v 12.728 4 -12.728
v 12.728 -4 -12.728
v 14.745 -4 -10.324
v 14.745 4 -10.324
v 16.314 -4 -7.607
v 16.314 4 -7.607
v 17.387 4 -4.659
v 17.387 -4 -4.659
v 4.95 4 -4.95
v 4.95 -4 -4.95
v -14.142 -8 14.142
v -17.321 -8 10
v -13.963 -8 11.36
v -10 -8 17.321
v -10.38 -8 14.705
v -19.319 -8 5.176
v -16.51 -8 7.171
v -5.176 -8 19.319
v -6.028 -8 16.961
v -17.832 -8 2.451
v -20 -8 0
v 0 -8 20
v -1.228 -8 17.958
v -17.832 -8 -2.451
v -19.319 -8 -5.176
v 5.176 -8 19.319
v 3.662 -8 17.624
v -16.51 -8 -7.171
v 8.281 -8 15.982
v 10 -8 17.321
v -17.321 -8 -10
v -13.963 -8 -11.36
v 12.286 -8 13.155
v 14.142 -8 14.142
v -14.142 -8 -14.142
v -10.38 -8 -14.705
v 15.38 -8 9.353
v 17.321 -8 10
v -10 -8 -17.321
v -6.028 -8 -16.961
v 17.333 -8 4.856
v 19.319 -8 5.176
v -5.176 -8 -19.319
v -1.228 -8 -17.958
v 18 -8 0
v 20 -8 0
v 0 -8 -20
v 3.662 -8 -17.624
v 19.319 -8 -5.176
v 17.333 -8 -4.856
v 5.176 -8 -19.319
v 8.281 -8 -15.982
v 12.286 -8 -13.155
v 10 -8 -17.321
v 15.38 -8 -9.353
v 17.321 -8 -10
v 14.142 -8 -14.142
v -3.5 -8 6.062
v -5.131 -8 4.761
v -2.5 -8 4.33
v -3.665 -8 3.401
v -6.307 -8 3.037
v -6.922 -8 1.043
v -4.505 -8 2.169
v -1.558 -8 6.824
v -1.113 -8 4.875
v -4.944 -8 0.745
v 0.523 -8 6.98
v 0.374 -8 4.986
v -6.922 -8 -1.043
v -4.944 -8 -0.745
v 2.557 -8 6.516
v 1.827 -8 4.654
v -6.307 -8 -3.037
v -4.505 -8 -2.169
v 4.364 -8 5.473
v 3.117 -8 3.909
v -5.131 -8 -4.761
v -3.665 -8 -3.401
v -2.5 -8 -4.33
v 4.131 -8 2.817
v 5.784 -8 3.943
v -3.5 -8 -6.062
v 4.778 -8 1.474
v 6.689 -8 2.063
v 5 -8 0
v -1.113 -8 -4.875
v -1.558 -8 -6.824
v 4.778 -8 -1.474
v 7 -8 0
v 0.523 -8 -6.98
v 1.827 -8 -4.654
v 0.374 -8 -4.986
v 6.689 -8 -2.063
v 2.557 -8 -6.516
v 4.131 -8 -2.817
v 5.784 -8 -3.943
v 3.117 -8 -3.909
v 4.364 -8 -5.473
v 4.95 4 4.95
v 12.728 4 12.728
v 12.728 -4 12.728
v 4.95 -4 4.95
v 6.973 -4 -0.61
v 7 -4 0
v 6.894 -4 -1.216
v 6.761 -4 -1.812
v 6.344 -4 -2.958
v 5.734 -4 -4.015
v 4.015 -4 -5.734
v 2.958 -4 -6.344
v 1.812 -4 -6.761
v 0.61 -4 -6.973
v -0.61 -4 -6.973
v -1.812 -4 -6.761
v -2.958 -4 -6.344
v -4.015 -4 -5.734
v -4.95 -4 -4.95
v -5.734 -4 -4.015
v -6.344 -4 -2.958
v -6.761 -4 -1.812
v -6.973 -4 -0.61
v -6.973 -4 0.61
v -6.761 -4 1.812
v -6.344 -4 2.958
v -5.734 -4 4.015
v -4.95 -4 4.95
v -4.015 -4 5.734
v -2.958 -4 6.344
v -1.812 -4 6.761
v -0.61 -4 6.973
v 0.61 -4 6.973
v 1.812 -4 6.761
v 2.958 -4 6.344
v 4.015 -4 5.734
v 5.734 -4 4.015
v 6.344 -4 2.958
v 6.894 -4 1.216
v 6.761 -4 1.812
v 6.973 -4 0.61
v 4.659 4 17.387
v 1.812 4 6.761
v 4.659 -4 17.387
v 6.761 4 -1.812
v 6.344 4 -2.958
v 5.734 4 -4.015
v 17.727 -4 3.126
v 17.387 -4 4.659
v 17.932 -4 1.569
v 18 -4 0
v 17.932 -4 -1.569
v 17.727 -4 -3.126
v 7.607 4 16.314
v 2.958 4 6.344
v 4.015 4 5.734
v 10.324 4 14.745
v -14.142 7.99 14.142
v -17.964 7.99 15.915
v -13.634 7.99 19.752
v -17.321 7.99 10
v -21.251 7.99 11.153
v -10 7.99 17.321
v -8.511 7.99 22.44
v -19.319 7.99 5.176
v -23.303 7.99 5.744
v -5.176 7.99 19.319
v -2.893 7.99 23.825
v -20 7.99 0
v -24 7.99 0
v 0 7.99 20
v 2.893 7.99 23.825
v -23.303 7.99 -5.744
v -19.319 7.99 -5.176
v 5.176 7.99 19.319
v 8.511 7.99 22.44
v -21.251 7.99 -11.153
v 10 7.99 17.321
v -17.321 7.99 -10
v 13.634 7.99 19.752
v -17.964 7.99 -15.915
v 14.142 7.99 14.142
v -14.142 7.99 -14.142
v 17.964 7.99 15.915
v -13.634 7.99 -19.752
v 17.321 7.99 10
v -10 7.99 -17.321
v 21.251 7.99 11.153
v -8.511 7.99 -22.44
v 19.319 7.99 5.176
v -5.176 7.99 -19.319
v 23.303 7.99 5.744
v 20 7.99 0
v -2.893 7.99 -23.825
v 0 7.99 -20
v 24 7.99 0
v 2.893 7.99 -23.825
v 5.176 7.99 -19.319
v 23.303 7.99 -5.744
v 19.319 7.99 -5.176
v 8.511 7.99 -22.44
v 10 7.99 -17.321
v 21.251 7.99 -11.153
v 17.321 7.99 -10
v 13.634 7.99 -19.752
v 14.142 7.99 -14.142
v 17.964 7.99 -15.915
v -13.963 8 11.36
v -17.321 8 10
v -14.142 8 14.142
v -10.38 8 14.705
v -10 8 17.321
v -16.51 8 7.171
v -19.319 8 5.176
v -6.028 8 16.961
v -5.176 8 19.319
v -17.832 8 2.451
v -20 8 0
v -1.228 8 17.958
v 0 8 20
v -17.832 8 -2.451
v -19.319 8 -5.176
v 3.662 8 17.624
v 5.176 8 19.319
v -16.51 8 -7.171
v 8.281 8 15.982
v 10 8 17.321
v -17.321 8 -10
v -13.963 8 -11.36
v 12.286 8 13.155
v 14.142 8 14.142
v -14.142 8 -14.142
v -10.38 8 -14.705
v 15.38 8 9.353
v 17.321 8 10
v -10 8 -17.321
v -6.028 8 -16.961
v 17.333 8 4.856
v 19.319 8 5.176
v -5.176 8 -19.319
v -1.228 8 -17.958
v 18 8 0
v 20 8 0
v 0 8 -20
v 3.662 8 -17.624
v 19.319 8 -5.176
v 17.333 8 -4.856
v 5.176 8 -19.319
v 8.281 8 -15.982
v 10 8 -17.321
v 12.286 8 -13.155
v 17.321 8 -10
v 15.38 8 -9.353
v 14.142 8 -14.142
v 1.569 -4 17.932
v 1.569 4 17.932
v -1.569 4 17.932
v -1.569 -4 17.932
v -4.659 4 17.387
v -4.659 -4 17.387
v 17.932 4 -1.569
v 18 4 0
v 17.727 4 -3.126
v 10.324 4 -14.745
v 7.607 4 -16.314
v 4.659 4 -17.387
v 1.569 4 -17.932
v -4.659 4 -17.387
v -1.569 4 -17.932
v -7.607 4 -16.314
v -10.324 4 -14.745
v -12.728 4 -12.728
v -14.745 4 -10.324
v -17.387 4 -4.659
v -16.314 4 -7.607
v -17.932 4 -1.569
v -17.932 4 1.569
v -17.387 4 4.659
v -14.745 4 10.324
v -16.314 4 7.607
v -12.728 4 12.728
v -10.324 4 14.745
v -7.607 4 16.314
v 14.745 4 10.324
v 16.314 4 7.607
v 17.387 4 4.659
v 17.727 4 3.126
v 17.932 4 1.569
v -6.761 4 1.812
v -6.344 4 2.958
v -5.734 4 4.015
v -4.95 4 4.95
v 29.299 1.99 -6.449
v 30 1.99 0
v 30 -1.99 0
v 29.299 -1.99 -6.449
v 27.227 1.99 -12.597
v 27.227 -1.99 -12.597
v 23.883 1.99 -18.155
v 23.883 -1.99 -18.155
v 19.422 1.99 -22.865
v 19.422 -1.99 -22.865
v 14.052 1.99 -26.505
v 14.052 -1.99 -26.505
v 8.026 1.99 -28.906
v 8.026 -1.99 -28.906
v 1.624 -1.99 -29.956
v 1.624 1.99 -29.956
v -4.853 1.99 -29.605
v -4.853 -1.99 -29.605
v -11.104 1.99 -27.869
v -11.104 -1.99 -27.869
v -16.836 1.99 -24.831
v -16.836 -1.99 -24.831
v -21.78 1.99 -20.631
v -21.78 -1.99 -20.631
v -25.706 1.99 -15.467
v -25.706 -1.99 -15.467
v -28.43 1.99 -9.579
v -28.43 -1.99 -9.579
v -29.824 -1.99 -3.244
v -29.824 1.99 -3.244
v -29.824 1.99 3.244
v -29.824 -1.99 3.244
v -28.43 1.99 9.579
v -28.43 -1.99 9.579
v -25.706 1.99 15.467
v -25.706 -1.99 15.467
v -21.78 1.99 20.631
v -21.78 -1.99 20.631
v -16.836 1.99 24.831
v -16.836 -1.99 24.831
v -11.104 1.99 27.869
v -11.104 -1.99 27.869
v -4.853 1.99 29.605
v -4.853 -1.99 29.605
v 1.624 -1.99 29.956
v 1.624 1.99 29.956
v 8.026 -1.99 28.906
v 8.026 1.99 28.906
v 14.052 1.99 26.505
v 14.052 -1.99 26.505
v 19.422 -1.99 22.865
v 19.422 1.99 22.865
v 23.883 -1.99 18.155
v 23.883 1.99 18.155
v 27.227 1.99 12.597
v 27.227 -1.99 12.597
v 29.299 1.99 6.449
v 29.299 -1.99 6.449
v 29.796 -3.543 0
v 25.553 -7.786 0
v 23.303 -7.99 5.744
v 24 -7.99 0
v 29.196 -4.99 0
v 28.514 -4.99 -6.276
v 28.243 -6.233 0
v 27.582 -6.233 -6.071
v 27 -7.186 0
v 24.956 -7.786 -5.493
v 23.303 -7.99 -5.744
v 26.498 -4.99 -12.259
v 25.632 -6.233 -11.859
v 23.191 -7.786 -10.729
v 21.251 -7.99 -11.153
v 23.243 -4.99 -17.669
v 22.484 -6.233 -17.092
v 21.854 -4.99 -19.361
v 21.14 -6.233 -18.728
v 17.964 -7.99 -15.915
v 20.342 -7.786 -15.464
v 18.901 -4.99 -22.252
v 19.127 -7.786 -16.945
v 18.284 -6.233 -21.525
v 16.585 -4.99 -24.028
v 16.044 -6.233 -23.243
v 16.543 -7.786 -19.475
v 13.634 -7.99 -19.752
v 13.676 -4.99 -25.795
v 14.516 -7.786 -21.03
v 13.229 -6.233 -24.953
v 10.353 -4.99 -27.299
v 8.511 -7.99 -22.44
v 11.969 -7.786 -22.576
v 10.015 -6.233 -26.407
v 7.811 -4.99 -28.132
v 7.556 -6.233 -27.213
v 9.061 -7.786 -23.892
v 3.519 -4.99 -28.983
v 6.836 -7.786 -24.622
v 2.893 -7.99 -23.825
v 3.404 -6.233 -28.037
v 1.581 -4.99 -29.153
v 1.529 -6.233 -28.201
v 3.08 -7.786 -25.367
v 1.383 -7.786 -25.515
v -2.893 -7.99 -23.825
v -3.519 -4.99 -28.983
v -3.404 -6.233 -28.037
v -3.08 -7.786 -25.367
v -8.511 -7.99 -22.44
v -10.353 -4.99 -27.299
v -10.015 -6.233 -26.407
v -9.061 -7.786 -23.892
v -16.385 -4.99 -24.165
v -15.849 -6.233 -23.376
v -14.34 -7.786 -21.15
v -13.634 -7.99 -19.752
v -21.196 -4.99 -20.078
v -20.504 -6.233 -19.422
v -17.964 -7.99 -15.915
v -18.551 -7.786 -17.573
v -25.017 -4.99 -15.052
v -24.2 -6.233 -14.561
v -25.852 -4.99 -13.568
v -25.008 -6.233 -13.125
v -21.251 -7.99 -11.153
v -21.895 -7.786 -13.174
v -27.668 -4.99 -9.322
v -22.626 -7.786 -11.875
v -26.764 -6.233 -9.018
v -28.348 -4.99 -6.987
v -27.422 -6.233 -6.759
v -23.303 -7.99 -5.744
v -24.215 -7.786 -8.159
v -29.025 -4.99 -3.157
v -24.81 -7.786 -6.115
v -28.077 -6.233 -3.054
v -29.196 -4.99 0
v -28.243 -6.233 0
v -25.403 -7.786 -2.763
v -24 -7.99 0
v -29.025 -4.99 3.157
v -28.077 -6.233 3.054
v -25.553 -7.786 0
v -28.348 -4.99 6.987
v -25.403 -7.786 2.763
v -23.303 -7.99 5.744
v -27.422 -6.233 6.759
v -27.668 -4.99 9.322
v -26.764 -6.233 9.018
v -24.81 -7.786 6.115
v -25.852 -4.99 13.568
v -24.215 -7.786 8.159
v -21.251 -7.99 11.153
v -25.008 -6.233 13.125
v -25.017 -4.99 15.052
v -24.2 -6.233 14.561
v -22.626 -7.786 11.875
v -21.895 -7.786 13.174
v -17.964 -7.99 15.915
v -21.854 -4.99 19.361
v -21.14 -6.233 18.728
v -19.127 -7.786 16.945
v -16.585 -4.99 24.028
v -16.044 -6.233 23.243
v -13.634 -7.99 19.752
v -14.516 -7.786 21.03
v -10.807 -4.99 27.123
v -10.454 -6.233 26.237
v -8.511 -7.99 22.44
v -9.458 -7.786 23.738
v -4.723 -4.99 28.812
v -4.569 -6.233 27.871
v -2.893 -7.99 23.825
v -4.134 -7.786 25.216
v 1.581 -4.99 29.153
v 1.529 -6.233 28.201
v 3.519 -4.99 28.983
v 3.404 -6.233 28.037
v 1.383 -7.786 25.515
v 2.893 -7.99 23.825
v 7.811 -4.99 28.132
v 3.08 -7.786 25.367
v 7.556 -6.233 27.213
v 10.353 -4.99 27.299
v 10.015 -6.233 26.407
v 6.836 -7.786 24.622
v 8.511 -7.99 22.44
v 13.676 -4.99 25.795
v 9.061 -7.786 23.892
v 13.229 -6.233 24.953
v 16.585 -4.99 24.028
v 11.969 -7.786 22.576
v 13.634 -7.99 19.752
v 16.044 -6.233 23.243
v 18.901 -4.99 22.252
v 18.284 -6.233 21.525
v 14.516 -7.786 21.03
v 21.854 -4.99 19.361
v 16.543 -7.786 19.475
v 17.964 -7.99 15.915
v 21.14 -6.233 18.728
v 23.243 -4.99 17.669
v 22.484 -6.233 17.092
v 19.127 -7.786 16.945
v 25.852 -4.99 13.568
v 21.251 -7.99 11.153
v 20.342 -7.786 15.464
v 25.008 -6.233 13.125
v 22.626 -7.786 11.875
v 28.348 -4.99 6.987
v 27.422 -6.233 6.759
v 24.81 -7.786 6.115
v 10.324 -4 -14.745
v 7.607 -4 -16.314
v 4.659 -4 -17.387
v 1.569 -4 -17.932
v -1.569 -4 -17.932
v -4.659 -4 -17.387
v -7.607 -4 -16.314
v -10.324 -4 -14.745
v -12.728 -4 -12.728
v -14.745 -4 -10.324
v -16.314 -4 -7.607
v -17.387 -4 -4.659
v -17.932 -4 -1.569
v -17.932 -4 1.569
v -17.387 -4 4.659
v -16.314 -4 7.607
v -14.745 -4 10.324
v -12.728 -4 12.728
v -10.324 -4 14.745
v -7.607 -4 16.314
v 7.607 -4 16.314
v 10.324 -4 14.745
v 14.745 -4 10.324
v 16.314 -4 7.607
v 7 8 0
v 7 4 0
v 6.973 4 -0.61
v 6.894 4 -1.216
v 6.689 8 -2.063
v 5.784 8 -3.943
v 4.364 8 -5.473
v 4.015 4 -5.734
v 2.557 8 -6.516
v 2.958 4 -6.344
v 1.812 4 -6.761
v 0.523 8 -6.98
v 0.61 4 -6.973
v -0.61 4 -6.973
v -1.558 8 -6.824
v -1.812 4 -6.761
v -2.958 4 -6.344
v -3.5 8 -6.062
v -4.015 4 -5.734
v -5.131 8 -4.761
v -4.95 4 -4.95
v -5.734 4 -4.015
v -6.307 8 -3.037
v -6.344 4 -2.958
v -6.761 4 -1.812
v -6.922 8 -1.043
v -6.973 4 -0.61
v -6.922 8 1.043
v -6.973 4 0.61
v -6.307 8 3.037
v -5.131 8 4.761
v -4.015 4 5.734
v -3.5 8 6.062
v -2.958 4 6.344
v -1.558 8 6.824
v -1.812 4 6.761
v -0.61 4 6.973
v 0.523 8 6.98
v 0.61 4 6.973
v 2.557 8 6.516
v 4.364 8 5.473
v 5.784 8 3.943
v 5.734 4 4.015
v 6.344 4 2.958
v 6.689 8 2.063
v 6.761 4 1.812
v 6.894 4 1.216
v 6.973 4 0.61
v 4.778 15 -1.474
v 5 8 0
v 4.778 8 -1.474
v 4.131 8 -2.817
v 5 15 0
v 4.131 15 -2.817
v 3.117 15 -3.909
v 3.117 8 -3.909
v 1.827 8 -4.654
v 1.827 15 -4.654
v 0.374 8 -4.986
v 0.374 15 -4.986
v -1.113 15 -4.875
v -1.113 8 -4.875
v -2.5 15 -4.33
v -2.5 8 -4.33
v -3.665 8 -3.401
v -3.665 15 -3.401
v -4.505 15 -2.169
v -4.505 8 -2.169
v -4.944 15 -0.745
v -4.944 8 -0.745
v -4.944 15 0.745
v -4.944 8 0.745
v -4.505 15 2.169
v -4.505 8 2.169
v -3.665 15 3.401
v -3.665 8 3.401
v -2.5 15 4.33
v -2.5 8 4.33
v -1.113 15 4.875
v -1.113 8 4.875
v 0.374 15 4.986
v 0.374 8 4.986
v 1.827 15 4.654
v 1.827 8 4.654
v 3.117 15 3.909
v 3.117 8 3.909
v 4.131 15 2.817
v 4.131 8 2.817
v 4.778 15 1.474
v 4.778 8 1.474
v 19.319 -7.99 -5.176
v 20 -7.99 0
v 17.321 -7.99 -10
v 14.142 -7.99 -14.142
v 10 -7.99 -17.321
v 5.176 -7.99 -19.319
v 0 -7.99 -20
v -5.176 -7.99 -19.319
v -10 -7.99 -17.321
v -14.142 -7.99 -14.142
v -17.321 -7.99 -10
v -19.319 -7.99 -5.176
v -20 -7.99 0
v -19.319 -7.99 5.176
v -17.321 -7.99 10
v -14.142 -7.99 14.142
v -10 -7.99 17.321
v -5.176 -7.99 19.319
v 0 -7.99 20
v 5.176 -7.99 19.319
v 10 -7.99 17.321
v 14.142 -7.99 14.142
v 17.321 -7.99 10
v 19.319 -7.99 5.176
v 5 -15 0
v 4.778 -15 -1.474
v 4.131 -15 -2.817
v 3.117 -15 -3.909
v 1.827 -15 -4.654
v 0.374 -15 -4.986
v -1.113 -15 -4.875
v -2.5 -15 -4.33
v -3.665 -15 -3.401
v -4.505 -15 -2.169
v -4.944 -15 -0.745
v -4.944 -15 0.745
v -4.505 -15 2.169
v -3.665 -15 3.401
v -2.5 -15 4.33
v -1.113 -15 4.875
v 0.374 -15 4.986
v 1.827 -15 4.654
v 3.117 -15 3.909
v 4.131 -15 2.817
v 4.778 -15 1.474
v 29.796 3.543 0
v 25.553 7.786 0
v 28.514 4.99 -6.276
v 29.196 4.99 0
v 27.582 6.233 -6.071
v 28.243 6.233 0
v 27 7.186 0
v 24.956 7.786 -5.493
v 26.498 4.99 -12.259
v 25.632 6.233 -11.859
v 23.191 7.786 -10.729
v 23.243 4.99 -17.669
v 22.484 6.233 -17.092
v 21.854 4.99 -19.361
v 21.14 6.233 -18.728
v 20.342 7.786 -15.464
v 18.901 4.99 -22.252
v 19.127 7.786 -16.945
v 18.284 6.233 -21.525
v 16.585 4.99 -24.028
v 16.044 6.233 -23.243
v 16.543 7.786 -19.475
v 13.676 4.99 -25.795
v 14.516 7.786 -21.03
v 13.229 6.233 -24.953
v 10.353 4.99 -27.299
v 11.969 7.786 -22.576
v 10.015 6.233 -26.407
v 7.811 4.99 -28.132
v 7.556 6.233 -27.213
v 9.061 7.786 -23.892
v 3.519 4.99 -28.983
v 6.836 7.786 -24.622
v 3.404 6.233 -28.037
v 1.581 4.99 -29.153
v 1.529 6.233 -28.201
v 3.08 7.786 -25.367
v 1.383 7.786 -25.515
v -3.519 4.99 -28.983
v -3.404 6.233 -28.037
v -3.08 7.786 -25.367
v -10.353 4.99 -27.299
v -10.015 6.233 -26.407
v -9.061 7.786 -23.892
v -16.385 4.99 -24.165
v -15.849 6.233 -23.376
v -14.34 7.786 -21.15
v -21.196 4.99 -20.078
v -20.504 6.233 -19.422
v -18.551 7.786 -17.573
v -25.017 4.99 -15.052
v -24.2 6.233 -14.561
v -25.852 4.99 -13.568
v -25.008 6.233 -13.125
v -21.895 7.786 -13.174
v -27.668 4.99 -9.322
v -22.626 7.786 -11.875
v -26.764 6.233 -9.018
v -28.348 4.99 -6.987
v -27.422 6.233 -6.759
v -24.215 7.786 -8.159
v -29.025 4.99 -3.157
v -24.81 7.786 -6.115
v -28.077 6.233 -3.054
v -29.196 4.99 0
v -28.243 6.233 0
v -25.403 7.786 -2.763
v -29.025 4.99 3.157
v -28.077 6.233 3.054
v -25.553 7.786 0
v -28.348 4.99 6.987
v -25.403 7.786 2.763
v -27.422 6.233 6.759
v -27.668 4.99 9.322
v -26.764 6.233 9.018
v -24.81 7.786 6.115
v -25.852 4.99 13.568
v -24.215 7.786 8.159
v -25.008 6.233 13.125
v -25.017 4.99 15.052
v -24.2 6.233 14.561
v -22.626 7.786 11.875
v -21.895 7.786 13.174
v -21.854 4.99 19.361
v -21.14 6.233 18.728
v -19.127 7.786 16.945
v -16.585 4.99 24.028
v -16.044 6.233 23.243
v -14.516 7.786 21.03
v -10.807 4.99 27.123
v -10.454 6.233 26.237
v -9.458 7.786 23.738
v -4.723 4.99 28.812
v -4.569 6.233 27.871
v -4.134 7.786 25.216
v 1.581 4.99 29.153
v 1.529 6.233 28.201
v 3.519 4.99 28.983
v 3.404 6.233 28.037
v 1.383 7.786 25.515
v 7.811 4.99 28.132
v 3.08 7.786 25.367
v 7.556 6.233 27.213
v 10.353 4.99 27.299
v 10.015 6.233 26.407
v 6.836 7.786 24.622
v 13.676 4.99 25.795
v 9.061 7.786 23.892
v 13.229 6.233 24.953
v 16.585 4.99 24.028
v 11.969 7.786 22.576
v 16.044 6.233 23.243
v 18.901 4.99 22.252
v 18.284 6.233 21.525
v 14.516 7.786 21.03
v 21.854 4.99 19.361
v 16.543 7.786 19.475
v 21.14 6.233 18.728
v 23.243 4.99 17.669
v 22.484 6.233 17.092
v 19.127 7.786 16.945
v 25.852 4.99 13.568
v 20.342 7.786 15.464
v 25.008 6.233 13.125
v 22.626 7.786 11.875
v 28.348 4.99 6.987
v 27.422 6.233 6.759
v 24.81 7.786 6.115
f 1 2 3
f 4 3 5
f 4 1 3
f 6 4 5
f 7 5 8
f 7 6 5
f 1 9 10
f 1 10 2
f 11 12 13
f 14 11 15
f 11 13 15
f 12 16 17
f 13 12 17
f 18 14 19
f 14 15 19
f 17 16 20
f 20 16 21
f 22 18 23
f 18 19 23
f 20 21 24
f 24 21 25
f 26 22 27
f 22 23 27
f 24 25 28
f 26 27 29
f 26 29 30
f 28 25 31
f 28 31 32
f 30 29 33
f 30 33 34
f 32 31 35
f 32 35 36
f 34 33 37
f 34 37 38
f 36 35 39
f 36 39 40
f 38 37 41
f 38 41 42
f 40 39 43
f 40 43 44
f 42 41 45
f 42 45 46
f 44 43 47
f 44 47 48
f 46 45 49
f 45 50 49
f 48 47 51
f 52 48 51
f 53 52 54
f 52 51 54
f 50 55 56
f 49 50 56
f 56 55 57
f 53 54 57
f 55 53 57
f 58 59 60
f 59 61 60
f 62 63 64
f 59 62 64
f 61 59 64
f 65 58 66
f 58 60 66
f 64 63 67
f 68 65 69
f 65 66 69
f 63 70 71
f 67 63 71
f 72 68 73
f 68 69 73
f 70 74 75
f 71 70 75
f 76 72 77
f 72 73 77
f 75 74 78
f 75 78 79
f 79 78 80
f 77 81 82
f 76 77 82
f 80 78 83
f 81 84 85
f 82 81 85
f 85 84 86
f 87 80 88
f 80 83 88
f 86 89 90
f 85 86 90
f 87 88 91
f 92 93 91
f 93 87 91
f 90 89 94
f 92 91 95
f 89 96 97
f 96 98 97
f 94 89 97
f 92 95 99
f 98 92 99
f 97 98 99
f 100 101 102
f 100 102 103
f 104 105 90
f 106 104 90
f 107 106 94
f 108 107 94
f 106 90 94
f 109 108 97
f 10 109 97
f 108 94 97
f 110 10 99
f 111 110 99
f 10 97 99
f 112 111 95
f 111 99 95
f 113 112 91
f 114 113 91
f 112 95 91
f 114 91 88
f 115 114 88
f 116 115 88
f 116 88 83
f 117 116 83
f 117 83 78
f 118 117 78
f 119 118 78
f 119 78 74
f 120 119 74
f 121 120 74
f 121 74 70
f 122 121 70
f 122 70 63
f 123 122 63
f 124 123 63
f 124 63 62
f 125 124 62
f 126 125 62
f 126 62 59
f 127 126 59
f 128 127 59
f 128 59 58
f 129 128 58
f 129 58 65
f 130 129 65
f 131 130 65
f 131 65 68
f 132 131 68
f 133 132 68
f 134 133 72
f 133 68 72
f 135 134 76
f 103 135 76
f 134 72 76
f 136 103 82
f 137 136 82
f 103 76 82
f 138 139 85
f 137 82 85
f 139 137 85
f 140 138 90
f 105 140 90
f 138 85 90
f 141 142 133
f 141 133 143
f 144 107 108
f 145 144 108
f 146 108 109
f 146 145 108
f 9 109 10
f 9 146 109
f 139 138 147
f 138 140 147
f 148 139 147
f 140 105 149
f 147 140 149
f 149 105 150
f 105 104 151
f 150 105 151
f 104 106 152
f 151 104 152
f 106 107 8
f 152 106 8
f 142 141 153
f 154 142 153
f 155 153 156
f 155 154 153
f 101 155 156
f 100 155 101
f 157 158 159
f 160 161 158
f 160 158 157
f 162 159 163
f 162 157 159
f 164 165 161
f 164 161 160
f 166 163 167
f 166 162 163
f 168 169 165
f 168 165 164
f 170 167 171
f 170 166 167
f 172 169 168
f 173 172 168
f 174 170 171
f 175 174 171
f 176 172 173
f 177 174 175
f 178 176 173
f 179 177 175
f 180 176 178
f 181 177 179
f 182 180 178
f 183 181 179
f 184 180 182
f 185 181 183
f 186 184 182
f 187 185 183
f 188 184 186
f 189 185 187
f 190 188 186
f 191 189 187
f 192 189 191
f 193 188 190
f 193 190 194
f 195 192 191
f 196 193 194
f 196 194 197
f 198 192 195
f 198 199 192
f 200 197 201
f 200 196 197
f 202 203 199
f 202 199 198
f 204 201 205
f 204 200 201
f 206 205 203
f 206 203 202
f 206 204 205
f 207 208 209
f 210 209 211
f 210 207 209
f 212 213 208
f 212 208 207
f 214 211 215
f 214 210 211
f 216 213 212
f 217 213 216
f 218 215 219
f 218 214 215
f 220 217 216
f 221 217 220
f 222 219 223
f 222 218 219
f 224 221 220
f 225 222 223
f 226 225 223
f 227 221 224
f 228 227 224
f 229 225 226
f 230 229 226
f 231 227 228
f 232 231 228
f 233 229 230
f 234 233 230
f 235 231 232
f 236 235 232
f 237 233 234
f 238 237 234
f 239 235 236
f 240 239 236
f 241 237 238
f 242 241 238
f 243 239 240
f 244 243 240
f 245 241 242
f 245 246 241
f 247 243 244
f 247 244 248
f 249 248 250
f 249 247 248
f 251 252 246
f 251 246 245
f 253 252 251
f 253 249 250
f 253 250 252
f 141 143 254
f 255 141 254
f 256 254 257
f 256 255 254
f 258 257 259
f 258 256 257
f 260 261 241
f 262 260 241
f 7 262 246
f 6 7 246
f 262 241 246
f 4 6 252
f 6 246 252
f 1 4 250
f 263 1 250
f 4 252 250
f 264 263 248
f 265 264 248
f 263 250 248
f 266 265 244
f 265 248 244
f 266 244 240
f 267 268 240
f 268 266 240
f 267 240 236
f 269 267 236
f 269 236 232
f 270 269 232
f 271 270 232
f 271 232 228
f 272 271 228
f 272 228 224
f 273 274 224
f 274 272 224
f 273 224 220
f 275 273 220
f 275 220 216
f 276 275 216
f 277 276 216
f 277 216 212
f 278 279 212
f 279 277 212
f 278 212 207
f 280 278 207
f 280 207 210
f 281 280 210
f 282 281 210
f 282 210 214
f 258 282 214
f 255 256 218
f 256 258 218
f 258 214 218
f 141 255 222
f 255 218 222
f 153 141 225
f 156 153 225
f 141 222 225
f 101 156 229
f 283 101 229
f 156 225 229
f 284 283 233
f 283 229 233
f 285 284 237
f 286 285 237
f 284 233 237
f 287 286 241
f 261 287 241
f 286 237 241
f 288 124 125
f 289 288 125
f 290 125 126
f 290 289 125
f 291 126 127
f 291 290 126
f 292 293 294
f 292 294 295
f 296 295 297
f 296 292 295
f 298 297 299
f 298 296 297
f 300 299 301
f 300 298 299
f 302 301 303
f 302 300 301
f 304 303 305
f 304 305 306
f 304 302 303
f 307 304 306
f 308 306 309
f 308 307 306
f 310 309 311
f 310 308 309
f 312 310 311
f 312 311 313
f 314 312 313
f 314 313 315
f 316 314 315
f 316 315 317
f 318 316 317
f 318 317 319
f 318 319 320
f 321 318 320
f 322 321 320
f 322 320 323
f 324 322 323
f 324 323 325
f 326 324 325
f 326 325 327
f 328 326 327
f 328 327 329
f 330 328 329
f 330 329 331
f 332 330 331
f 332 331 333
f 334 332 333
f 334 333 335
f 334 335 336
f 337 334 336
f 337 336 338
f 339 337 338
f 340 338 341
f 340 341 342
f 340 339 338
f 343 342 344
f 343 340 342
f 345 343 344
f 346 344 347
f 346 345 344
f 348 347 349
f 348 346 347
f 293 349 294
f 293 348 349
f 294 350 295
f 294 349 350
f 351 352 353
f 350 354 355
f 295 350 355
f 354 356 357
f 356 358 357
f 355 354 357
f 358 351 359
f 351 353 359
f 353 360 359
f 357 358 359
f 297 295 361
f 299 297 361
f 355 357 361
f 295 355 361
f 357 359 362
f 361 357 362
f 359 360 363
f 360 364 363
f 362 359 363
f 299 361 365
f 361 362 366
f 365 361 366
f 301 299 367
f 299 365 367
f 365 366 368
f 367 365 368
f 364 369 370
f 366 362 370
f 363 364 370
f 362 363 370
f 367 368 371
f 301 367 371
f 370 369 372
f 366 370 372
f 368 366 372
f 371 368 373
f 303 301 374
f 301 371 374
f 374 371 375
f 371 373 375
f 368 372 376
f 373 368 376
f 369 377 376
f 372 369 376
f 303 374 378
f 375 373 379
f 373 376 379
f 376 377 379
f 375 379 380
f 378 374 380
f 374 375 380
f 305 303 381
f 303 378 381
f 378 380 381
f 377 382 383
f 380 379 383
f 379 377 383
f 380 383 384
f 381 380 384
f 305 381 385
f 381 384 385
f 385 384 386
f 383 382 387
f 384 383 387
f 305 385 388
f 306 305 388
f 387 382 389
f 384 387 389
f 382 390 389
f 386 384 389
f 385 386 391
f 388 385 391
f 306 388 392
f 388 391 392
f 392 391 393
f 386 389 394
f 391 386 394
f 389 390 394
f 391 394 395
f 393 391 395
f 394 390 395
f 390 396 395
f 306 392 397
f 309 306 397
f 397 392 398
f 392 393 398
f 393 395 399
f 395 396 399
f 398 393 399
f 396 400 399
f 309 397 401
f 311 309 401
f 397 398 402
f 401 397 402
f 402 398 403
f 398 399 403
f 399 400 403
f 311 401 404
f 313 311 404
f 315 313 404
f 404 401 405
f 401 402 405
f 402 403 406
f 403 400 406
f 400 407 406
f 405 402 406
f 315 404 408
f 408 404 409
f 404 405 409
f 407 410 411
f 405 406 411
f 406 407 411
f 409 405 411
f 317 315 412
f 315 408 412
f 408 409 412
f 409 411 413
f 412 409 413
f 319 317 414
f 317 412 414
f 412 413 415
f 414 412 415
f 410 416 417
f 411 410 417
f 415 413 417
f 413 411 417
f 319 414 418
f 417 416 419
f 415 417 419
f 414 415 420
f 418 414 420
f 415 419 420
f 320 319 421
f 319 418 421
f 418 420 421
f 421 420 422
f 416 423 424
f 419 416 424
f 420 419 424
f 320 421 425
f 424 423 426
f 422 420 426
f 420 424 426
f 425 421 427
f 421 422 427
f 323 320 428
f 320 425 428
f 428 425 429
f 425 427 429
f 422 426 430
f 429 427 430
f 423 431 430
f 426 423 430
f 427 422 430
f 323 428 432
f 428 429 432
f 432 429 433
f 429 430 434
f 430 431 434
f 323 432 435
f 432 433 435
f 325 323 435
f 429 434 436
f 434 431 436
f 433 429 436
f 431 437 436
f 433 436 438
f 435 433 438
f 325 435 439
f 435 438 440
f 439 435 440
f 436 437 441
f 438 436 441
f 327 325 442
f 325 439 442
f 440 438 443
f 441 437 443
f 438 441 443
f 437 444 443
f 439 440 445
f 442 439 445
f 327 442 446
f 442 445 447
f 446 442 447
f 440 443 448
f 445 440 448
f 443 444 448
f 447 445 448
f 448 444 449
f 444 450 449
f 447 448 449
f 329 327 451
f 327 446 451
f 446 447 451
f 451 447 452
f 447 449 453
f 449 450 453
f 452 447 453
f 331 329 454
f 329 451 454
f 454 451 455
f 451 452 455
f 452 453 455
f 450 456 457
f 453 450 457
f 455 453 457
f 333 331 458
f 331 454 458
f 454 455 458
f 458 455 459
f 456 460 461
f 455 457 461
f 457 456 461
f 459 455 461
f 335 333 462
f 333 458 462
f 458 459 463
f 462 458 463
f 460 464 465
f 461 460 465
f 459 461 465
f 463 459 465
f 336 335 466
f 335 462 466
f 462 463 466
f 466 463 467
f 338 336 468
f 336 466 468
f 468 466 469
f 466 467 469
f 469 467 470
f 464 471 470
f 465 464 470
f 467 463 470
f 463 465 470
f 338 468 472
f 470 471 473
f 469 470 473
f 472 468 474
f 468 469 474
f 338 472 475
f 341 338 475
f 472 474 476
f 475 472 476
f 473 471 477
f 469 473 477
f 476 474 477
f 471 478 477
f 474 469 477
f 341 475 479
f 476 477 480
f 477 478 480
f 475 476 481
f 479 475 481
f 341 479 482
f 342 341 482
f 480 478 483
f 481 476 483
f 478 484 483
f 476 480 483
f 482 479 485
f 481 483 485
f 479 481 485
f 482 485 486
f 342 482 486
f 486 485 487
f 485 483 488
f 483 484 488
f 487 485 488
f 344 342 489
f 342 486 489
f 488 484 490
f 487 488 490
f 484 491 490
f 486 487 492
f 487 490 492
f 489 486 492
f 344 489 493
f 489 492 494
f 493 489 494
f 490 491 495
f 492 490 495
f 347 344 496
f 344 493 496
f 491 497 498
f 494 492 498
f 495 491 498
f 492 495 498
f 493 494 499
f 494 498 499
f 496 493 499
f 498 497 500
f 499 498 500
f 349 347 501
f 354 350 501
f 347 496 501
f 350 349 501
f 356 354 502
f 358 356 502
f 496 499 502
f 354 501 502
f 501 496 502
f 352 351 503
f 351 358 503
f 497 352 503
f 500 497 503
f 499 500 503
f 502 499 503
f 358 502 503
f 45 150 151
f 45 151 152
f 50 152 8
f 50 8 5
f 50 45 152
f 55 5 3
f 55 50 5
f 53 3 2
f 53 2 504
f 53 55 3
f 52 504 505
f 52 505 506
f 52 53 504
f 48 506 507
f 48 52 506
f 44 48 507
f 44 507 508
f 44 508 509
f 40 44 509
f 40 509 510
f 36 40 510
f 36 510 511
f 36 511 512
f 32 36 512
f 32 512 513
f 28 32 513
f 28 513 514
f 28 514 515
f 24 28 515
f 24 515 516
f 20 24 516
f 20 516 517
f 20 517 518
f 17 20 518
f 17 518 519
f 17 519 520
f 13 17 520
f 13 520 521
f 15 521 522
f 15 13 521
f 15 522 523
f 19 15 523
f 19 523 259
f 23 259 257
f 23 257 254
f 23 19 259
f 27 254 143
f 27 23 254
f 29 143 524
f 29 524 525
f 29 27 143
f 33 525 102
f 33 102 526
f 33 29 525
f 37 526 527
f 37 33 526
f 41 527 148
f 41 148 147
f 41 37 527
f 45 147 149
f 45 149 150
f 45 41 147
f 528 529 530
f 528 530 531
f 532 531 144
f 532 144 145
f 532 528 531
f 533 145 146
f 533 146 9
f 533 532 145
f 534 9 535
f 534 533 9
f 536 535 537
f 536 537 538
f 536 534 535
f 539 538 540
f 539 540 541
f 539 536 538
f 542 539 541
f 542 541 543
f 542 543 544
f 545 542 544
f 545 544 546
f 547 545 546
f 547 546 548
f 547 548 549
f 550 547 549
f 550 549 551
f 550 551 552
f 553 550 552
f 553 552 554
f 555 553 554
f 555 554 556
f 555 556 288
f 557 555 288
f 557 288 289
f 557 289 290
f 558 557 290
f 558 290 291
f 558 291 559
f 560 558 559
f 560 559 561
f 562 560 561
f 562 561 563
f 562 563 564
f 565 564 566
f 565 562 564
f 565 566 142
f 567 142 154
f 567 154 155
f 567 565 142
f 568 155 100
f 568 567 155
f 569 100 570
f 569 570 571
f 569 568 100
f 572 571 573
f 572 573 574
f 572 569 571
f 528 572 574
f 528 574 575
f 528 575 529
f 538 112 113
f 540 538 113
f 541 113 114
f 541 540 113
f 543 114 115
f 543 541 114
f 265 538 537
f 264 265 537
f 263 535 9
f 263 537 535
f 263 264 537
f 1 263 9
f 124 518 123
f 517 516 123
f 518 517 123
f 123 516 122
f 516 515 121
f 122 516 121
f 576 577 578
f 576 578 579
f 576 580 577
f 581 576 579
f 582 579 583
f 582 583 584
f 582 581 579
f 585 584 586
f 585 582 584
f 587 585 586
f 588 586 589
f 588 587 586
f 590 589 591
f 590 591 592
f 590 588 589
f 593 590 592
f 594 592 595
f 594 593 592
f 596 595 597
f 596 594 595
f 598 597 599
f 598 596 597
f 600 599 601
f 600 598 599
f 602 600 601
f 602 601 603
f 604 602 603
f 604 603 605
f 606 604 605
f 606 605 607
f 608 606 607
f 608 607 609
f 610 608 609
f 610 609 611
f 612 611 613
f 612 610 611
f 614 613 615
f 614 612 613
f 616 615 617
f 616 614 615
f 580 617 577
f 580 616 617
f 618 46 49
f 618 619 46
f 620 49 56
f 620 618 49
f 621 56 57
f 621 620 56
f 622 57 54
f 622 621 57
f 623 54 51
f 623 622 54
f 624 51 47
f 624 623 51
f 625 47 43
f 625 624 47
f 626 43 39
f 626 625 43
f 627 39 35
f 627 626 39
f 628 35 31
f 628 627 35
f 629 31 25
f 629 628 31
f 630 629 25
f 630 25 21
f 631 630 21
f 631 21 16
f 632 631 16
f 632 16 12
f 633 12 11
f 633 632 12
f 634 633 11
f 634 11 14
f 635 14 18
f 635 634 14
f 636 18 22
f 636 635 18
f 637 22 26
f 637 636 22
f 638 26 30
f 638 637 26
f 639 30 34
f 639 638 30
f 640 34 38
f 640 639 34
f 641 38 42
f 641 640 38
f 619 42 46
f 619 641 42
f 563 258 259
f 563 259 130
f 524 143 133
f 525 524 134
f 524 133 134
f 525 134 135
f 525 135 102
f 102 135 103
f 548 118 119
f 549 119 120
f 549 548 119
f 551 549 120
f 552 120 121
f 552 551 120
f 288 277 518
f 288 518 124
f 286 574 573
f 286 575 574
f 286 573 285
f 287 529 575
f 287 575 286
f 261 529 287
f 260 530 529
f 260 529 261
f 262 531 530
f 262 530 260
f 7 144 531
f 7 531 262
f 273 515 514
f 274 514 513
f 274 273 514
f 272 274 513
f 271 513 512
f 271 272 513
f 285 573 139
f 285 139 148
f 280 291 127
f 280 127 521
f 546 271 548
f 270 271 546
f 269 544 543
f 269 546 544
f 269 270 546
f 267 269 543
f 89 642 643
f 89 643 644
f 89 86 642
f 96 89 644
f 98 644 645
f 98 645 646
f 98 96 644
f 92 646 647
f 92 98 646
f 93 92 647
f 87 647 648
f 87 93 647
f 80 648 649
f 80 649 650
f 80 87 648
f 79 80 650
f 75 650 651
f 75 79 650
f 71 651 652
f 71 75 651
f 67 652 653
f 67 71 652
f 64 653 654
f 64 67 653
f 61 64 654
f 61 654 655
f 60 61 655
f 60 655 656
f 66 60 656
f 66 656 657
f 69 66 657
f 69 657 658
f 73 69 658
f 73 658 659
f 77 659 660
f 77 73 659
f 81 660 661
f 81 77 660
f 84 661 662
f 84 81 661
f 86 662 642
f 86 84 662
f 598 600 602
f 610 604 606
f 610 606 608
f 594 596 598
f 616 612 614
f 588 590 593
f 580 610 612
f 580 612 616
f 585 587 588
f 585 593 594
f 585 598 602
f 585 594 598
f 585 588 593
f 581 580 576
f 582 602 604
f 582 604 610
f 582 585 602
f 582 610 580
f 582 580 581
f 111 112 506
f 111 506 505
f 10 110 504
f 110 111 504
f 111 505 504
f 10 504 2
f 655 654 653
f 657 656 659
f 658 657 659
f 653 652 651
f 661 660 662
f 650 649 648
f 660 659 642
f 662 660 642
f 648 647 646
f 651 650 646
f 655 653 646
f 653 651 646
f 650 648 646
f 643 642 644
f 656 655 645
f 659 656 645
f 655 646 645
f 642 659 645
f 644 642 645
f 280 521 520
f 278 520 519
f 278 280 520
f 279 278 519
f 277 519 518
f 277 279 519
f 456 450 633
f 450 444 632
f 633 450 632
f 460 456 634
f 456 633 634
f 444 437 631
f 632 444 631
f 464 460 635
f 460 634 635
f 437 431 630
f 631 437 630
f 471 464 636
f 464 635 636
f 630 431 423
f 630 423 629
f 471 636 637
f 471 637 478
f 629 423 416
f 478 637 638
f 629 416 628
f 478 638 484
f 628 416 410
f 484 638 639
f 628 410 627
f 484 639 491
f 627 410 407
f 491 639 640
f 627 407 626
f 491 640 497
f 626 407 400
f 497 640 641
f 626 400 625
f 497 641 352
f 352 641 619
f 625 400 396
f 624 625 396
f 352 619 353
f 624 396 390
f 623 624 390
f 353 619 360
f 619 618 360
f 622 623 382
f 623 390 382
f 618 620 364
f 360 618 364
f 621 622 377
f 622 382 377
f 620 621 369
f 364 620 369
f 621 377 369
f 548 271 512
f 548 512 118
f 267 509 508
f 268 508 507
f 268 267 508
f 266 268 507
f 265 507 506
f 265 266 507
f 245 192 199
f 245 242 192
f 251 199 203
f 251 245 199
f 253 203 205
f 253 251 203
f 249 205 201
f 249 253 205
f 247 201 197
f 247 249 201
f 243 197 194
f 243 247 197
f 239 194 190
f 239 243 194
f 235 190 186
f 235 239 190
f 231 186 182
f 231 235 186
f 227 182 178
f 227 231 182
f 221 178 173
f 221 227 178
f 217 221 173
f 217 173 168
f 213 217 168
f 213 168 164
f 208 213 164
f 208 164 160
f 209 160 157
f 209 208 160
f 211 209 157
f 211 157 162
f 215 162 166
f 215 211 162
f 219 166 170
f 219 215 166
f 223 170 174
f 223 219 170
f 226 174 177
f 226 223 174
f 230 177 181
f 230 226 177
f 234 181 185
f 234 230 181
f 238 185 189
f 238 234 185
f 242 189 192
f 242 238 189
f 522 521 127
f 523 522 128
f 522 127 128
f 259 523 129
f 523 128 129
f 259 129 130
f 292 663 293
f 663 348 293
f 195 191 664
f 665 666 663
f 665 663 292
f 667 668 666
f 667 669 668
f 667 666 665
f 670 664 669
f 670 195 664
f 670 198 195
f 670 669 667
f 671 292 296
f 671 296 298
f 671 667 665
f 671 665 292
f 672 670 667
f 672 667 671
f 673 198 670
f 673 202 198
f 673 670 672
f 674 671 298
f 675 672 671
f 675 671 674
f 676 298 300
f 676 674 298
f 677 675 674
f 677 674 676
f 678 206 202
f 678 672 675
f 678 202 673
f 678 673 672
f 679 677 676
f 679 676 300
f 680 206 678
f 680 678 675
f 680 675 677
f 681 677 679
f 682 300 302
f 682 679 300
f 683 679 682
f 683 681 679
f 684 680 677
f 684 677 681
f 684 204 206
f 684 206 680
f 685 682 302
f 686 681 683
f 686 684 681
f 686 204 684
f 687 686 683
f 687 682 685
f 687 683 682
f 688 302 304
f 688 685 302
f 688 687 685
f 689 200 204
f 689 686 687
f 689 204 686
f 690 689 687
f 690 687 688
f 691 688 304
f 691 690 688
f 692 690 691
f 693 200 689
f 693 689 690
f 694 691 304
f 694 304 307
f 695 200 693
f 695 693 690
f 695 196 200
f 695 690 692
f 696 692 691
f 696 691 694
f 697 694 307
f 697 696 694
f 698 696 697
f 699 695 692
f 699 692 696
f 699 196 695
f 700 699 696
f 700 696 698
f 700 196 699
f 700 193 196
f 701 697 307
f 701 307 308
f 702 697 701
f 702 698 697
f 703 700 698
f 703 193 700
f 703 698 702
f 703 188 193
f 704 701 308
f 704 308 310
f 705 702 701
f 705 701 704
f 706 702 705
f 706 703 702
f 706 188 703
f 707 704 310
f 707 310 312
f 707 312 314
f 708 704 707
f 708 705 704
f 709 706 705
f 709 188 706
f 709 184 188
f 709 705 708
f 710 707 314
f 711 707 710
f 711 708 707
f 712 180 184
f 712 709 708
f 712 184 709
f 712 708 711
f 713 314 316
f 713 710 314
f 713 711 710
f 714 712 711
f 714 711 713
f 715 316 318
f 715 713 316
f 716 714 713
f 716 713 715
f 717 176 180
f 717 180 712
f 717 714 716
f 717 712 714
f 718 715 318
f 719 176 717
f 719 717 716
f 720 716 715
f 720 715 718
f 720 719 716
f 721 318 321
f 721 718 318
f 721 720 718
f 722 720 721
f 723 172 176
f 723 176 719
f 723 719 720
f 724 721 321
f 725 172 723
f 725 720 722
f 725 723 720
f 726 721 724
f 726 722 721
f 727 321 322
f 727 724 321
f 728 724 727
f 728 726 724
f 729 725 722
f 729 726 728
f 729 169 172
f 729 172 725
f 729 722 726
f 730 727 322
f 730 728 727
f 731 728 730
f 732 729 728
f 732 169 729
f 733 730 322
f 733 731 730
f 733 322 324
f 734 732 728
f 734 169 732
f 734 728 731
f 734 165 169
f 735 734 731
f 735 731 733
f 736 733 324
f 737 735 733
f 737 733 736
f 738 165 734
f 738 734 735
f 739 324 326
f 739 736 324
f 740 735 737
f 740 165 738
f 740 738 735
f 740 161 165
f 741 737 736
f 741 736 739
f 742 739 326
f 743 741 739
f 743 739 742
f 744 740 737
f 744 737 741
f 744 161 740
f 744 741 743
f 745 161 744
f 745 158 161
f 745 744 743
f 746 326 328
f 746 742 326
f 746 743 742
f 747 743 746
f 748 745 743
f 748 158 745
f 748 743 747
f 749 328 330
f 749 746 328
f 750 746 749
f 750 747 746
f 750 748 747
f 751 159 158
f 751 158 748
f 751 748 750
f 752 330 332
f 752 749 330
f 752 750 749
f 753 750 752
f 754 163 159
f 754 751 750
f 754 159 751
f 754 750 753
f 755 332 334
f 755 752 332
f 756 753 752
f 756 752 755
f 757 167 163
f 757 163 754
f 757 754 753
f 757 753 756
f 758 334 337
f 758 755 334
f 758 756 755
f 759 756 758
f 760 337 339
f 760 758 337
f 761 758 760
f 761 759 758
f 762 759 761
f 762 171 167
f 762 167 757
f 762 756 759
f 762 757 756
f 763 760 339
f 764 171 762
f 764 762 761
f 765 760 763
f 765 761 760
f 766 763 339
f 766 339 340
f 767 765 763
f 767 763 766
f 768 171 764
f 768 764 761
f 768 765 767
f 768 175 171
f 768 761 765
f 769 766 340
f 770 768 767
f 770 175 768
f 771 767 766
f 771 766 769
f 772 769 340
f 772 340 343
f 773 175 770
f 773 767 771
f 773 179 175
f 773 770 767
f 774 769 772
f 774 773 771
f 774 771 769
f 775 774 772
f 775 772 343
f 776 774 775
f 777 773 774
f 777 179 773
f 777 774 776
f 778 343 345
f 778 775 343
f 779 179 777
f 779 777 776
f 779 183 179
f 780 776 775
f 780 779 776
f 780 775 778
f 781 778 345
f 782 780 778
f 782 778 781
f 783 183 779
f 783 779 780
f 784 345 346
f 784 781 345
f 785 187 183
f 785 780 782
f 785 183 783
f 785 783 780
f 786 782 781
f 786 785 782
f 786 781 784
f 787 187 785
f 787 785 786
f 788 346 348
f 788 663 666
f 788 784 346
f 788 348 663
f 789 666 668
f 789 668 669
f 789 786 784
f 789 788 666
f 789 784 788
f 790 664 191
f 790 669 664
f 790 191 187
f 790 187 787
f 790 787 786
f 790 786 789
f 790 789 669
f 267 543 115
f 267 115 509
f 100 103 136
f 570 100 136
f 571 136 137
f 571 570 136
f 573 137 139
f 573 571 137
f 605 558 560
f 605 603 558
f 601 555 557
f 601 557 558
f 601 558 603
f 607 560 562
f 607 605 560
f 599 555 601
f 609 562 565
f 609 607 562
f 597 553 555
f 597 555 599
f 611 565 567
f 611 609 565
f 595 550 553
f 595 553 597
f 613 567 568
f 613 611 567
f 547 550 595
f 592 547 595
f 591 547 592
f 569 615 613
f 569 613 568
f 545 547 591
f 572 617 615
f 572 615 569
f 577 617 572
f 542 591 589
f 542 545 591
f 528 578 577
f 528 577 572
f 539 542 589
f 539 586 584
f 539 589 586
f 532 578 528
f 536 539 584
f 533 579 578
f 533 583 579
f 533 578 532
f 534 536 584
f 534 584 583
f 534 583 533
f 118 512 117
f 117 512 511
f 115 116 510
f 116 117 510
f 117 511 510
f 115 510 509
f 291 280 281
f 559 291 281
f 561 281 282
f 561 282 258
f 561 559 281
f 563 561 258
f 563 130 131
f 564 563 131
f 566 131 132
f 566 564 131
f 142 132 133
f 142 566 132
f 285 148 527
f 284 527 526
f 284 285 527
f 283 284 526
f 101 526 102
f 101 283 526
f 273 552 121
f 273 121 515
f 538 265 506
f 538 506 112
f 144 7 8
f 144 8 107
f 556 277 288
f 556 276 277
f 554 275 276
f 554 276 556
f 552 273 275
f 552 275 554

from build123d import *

# Parameters (mm, degrees)
EXTRUDE_1_DEPTH          = 15
EXTRUDE_1_DEPTH_BACK     = 15
SKETCH_1_R               = 5
EXTRUDE_2_DEPTH          = 8
EXTRUDE_2_DEPTH_BACK     = 8
SKETCH_2_R               = 20
SKETCH_4_R               = 18
SKETCH_4_R_2             = 7
CUT_EXTRUDE_1_DEPTH      = 4
CUT_EXTRUDE_2_DEPTH      = 14
PATTERN_CIRCULAR_1_COUNT = 6
EXTRUDE_3_DEPTH          = 7.99
EXTRUDE_3_DEPTH_BACK     = 7.99
SKETCH_6_R               = 30
SKETCH_6_R_2             = 20
FILLET_1_R               = 6


with BuildPart() as part:
    # 草图1 → 凸台-拉伸1 (new, two sides: drawn at the far end of the back side and taken through both)
    with BuildSketch(Plane(origin=(0, 0, 0), x_dir=(1, 0, 0), z_dir=(0, 1, 0)).offset(-EXTRUDE_1_DEPTH_BACK)):
        Circle(SKETCH_1_R)
    extrude(amount=EXTRUDE_1_DEPTH + EXTRUDE_1_DEPTH_BACK)

    # 草图2 → 凸台-拉伸2 (add, two sides: drawn at the far end of the back side and taken through both)
    with BuildSketch(Plane(origin=(0, 0, 0), x_dir=(1, 0, 0), z_dir=(0, 1, 0)).offset(-EXTRUDE_2_DEPTH_BACK)):
        Circle(SKETCH_2_R)
    extrude(amount=EXTRUDE_2_DEPTH + EXTRUDE_2_DEPTH_BACK)

    # 草图4 → 切除-拉伸1 (cut)
    with BuildSketch(Plane(origin=(0, 8, 0), x_dir=(1, 0, 0), z_dir=(0, 1, 0))):
        Circle(SKETCH_4_R)
        Circle(SKETCH_4_R_2, mode=Mode.SUBTRACT)
    cut_extrude_1 = extrude(amount=-CUT_EXTRUDE_1_DEPTH, mode=Mode.SUBTRACT)

    # 镜向1: 切除-拉伸1 across plane
    add(cut_extrude_1.mirror(Plane.ZX), mode=Mode.SUBTRACT)

    # 草图5 → 切除-拉伸2 (cut)
    with BuildSketch(Plane(origin=(0, 4, 0), x_dir=(1, 0, 0), z_dir=(0, 1, 0))):
        with BuildLine():
            Line((-1.811733, 6.761481), (-4.658743, 17.386665))
            ThreePointArc((-4.658743, 17.386665), (0, 18), (4.658743, 17.386665))
            Line((4.658743, 17.386665), (1.811733, 6.761481))
            ThreePointArc((1.811733, 6.761481), (0, 7), (-1.811733, 6.761481))
        make_face()
    cut_extrude_2 = extrude(amount=-CUT_EXTRUDE_2_DEPTH, mode=Mode.SUBTRACT)

    # 阵列(圆周)1: 切除-拉伸2 ×6 about axis
    pattern_circular_1_axis = Axis((0, -15, 0), (0, 1, 0))
    for i in range(1, PATTERN_CIRCULAR_1_COUNT):
        add(cut_extrude_2.rotate(pattern_circular_1_axis, i * 360 / PATTERN_CIRCULAR_1_COUNT), mode=Mode.SUBTRACT)

    # 草图6 → 凸台-拉伸3 (add, two sides: drawn at the far end of the back side and taken through both)
    with BuildSketch(Plane(origin=(0, 0, 0), x_dir=(1, 0, 0), z_dir=(0, 1, 0)).offset(-EXTRUDE_3_DEPTH_BACK)):
        Circle(SKETCH_6_R)
        Circle(SKETCH_6_R_2, mode=Mode.SUBTRACT)
    extrude(amount=EXTRUDE_3_DEPTH + EXTRUDE_3_DEPTH_BACK)

    # 圆角1
    fillet_1_edges = [part.edges().sort_by_distance(p)[0] for p in [
        (-30, 7.99, 0),
        (-30, -7.99, 0),
    ]]
    fillet(fillet_1_edges, radius=FILLET_1_R)


solid = part.part
